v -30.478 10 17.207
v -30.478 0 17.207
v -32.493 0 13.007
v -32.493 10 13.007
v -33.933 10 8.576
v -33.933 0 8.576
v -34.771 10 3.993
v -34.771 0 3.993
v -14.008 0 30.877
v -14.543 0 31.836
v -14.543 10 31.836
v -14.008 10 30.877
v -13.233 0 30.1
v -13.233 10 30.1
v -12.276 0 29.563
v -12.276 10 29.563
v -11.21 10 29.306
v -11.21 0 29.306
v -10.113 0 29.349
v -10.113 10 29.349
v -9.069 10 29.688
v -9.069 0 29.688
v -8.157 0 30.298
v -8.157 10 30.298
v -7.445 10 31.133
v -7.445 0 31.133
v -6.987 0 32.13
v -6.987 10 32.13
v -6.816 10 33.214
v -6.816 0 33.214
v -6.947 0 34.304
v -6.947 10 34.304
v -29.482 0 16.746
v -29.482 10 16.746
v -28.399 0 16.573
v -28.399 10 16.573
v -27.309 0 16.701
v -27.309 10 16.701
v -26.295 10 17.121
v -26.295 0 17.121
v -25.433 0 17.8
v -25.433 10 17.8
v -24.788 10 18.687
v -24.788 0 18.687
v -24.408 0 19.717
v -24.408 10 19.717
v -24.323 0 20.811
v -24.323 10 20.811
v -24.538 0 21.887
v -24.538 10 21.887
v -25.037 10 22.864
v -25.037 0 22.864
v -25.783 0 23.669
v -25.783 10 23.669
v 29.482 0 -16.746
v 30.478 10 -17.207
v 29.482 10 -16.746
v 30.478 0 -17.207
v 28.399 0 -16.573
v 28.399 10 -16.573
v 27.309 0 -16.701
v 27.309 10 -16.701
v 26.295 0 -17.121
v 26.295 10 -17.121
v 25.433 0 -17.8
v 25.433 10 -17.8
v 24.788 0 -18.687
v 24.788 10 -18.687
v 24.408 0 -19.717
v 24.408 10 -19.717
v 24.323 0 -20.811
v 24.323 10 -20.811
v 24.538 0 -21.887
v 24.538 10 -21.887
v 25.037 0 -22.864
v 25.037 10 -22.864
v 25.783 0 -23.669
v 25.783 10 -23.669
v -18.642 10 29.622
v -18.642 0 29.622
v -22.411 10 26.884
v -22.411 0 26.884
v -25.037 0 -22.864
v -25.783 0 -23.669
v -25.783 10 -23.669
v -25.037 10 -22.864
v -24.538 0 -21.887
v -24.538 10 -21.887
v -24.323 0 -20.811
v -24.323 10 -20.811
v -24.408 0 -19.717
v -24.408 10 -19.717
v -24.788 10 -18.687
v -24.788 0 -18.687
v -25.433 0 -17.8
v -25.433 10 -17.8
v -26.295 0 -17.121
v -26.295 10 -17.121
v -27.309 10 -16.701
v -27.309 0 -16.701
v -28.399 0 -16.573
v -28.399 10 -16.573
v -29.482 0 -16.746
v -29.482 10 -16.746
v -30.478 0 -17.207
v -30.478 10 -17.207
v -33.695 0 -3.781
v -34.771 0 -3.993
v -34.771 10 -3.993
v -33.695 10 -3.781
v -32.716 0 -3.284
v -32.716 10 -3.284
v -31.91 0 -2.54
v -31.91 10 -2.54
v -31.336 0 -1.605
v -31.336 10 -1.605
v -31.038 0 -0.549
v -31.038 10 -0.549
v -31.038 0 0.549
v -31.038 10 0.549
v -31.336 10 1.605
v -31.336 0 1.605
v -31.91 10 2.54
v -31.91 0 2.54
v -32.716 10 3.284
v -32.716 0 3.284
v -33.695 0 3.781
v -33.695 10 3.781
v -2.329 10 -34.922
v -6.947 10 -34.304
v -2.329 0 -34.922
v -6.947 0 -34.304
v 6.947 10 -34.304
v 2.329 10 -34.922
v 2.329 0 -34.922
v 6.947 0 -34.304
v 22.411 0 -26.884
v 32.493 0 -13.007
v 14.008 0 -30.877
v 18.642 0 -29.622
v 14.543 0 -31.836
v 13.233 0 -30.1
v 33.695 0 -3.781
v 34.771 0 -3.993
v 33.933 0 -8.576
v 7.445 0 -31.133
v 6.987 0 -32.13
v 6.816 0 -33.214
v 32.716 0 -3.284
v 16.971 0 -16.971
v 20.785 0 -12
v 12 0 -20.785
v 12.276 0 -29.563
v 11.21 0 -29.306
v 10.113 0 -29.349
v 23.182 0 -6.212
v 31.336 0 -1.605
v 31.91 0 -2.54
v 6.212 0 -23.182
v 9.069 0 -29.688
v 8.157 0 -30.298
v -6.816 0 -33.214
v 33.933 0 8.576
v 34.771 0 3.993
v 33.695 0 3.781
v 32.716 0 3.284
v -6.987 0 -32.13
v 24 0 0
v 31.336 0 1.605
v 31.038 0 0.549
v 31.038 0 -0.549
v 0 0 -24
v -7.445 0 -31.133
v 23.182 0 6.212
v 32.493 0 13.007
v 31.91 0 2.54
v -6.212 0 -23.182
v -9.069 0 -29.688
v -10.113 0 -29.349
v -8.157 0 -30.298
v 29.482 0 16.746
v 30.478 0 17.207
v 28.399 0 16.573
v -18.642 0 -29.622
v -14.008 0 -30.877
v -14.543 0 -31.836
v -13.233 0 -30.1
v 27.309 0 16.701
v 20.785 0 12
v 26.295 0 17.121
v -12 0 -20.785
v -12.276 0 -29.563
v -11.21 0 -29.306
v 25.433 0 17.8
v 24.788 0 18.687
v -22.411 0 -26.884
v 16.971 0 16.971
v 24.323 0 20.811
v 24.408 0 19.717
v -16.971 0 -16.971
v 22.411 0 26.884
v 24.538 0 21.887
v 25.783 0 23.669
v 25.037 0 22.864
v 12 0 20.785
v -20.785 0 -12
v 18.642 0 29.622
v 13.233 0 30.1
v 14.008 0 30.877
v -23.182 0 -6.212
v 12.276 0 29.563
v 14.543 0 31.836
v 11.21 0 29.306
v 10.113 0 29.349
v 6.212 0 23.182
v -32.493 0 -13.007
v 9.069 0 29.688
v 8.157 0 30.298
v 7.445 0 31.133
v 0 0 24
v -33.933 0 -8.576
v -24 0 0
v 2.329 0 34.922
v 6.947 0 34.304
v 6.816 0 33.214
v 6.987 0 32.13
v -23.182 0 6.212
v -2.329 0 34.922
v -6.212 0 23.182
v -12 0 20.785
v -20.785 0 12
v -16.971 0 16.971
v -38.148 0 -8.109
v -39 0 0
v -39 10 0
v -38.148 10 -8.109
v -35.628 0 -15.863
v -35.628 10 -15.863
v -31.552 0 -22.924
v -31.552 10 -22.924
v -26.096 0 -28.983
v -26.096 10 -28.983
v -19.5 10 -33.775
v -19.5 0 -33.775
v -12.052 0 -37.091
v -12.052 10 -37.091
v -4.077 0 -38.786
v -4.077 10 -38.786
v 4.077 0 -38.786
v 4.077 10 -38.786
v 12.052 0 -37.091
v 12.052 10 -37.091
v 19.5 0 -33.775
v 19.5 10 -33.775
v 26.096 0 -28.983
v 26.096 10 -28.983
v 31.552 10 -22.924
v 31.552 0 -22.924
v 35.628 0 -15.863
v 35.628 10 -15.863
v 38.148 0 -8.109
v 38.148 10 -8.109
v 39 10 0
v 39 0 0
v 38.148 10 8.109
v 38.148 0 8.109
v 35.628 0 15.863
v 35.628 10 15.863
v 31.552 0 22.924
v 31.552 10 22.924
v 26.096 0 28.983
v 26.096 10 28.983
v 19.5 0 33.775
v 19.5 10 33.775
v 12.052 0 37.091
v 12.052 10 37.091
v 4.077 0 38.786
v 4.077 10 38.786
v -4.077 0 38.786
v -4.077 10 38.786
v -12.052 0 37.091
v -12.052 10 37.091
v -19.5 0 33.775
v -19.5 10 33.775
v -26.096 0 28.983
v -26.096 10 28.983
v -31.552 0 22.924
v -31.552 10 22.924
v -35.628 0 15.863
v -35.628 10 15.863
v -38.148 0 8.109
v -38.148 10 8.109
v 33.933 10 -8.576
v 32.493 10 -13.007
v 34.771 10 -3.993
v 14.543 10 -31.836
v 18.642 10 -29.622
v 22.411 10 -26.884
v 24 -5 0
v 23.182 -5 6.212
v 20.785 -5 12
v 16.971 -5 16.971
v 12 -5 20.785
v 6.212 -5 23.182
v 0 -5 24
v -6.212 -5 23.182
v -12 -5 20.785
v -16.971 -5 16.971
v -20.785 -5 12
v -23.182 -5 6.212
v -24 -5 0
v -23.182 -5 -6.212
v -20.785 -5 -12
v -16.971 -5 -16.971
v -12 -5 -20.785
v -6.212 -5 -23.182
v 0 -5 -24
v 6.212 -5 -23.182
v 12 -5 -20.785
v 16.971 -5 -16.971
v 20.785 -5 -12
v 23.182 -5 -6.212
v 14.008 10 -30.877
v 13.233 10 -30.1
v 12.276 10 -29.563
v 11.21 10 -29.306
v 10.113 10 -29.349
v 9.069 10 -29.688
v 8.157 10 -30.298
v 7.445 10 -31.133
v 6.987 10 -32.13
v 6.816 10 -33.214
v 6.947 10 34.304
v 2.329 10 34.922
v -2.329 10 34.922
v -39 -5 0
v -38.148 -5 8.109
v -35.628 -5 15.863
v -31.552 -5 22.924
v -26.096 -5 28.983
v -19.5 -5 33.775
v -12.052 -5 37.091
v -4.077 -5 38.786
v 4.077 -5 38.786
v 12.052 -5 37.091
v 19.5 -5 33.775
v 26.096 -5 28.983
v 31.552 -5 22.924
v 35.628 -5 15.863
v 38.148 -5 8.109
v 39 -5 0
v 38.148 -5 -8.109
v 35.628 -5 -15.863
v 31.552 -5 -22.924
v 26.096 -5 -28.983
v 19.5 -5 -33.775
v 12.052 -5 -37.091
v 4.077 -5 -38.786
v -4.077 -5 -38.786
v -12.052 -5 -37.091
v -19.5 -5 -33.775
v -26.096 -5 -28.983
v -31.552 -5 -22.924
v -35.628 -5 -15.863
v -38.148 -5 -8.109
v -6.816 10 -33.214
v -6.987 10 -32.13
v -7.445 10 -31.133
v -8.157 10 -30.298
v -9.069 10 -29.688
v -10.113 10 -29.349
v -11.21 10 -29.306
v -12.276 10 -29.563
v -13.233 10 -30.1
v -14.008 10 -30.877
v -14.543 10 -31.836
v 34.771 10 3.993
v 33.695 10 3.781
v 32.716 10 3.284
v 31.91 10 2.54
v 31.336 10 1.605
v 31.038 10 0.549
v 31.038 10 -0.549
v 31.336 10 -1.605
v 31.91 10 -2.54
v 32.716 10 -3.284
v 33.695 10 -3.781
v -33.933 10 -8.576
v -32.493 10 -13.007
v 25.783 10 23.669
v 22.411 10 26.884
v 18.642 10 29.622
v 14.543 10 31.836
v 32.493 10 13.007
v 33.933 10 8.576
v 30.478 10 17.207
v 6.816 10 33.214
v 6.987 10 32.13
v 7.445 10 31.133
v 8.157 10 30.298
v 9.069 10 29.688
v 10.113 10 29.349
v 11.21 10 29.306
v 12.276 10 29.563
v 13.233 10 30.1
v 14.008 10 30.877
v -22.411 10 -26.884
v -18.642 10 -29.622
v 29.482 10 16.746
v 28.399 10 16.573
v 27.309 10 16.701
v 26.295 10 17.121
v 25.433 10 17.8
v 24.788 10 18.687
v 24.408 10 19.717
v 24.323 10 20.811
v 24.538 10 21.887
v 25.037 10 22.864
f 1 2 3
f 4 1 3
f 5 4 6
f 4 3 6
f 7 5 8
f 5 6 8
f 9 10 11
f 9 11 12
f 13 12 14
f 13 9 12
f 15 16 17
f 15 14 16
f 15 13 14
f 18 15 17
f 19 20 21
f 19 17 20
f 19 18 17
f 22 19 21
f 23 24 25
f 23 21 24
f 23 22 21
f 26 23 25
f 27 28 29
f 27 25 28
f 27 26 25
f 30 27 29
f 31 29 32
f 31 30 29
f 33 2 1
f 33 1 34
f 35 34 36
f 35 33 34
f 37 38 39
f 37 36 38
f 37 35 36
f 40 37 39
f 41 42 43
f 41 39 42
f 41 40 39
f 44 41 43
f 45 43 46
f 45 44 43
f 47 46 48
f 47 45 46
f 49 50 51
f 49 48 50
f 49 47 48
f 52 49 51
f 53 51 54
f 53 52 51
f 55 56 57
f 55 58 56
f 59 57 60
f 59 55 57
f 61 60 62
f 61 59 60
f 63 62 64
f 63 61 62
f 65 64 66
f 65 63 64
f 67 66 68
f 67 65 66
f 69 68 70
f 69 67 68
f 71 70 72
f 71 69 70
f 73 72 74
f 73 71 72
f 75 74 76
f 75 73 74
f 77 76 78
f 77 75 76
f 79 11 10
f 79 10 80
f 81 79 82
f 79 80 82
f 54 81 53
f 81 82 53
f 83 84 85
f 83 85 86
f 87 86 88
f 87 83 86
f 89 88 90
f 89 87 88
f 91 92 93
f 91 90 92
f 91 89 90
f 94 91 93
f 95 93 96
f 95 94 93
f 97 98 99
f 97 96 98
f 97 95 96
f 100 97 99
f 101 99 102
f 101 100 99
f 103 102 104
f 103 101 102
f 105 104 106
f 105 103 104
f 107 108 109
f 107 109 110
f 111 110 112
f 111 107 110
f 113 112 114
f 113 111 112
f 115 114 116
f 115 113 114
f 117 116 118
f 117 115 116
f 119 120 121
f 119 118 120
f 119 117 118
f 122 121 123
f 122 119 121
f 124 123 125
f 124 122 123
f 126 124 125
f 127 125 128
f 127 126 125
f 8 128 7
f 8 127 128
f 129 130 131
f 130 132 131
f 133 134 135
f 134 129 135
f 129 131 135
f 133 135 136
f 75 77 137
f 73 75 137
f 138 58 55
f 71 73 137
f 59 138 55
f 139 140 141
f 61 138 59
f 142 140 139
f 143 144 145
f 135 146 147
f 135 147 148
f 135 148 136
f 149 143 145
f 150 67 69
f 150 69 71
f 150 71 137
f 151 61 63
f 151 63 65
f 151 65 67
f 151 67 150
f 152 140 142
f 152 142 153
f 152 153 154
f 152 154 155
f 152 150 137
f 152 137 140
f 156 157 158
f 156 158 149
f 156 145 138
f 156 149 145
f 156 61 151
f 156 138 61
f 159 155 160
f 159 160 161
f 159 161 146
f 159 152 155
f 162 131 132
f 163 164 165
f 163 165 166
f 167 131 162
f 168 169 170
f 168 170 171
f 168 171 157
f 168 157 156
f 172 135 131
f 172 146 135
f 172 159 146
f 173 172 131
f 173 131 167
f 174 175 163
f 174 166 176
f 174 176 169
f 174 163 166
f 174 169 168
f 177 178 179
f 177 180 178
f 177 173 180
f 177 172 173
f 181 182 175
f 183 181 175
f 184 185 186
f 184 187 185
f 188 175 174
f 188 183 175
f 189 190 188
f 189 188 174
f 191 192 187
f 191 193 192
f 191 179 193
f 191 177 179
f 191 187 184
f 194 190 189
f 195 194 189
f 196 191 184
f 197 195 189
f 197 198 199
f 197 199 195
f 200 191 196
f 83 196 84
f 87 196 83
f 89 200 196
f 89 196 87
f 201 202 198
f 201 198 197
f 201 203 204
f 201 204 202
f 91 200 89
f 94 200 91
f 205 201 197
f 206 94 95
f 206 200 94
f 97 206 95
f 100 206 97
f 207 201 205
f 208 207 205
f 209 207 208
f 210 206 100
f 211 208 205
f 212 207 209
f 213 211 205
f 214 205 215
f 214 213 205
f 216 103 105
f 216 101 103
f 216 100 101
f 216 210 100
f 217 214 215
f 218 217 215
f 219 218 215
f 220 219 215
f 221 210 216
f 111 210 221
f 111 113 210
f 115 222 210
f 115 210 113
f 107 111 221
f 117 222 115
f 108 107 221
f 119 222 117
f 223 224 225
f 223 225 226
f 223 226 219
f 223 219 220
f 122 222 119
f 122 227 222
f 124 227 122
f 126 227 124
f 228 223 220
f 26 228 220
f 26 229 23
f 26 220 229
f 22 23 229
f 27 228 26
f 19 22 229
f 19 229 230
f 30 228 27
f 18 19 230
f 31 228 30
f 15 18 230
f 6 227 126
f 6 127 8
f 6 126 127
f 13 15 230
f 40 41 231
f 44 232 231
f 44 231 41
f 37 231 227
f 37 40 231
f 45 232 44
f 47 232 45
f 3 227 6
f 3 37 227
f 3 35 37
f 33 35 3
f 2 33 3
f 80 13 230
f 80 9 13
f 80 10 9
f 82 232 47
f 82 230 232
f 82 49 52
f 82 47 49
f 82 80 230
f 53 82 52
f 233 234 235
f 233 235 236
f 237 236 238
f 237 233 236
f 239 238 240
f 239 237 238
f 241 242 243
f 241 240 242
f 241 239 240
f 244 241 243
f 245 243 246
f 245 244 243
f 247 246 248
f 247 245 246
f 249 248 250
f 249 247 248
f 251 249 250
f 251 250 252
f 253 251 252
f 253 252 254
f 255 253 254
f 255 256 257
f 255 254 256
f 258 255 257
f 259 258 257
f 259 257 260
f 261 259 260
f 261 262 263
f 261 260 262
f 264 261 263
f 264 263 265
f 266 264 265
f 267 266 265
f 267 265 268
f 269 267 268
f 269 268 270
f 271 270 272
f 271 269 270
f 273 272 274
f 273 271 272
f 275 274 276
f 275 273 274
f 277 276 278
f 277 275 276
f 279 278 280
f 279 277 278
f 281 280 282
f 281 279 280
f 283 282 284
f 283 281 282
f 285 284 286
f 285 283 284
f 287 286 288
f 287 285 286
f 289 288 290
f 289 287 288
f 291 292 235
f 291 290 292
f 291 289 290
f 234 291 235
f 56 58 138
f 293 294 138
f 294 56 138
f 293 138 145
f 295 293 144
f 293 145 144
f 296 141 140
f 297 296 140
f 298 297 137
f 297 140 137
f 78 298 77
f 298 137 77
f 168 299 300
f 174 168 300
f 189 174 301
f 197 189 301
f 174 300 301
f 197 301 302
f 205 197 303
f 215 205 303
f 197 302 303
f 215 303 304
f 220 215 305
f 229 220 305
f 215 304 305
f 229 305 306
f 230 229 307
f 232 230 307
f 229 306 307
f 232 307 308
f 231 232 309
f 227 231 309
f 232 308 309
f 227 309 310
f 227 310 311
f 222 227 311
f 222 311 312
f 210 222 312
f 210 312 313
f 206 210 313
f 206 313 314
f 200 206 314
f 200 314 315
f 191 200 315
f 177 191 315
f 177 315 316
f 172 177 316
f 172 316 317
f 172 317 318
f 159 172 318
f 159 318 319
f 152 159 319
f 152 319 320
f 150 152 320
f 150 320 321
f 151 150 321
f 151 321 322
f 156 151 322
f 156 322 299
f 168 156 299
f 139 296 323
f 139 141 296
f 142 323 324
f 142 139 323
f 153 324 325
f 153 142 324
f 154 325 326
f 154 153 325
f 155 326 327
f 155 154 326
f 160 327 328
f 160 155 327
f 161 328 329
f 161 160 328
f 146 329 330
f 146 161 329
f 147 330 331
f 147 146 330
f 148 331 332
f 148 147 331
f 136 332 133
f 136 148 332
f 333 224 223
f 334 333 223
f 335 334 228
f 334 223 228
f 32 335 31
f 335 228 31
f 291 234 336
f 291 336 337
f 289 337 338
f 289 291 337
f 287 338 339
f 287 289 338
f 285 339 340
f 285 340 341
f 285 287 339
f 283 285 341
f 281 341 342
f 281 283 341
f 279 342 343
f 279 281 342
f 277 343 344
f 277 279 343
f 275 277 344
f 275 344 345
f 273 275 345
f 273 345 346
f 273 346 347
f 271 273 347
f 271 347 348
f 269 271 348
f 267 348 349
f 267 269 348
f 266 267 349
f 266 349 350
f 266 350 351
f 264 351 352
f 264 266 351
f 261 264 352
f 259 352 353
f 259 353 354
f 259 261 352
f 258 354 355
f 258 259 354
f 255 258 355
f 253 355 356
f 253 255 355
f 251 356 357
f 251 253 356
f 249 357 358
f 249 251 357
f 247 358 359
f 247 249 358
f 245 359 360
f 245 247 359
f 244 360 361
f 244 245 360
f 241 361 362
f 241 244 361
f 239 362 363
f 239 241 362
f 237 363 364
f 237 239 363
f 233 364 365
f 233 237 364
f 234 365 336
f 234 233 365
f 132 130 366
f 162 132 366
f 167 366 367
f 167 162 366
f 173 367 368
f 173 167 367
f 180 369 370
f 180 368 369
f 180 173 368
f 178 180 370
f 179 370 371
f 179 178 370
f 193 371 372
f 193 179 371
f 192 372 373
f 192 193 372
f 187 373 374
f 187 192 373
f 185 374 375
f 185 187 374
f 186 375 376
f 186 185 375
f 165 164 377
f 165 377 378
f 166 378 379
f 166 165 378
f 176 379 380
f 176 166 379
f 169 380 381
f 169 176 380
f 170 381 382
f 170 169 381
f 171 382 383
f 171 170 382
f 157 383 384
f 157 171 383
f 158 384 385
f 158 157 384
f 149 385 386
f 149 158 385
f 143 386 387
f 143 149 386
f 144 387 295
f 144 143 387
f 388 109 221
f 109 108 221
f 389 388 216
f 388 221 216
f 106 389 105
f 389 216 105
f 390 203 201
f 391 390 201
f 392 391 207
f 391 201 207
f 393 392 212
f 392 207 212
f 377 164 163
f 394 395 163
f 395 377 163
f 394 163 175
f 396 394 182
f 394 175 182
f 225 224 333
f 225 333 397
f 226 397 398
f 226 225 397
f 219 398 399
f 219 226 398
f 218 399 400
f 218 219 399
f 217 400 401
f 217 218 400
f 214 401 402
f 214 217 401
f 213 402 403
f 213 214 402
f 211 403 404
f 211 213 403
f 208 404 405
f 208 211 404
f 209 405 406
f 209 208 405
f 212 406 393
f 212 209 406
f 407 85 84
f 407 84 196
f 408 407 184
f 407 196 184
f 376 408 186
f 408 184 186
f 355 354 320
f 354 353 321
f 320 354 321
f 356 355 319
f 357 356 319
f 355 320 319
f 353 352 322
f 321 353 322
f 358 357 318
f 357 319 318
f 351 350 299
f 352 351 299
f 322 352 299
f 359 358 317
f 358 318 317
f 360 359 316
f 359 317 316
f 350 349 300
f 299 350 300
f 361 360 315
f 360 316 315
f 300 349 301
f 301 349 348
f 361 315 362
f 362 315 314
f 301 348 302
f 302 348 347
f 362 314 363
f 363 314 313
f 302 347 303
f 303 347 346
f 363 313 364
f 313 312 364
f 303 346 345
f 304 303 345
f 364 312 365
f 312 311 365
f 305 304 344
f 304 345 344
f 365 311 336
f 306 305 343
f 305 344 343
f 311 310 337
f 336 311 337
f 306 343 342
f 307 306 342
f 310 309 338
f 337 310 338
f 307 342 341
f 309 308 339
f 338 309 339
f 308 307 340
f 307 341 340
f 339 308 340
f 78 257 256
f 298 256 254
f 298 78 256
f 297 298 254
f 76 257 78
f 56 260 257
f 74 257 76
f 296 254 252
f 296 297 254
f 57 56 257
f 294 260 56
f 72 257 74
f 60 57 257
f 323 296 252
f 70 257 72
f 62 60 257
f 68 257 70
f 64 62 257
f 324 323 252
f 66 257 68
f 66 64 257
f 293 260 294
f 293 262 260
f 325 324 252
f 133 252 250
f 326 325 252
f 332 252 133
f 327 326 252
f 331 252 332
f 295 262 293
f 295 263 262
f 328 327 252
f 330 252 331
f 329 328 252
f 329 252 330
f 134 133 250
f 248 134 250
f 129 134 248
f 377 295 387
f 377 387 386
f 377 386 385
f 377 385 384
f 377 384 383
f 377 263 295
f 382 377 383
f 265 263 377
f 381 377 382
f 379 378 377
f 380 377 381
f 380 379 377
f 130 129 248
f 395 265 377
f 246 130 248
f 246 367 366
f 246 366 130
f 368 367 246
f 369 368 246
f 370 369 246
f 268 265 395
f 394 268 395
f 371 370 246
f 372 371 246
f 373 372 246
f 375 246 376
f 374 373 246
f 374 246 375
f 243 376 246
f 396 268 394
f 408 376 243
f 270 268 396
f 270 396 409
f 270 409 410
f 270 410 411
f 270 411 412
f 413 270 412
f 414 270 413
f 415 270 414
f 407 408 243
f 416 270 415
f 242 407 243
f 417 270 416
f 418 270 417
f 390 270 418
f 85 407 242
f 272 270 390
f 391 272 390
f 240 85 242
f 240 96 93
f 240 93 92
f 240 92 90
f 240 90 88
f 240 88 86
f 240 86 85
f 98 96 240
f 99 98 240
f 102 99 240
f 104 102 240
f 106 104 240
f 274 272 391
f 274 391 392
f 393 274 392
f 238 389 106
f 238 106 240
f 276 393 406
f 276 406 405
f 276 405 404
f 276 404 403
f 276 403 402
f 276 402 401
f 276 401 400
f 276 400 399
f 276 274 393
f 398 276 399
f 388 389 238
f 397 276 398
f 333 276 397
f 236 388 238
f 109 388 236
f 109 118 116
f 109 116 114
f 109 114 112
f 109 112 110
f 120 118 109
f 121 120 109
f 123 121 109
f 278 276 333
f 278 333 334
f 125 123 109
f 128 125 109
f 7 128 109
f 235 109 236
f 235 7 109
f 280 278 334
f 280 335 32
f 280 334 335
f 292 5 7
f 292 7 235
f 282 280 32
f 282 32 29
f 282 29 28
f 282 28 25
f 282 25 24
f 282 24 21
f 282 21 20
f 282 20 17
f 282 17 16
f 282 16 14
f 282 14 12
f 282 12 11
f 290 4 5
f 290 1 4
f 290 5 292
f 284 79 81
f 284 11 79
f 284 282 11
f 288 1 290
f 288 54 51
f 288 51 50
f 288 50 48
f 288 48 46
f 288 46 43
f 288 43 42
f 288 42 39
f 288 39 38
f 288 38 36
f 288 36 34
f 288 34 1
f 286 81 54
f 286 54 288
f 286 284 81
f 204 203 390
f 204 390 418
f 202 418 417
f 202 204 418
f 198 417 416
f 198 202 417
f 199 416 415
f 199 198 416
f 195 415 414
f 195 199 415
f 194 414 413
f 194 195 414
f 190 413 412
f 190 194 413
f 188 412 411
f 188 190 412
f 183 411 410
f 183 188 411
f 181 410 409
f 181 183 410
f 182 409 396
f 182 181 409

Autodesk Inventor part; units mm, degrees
ref_plane "YZ Plane" through (0, 0, 0) normal (1, 0, 0) x (0, 1, 0)
ref_plane "XZ Plane" through (0, 0, 0) normal (0, 1, 0) x (-1, 0, 0)
ref_plane "XY Plane" through (0, 0, 0) normal (0, 0, 1) x (1, 0, 0)
sketch "Sketch1" plane through (0, 0, 0) normal (0, 1, 0) x (-1, 0, 0)
  circle A0 centre (0, 0) radius 35
  circle A1 centre (35, 0) radius 4
  circle A2 centre (28.3156, 20.5725) radius 4
  circle A3 centre (10.8156, 33.287) radius 4
  circle A4 centre (-10.8156, 33.287) radius 4
  circle A5 centre (-28.3156, 20.5725) radius 4
  circle A6 centre (-35, 0) radius 4
  circle A7 centre (-28.3156, -20.5725) radius 4
  circle A8 centre (-10.8156, -33.287) radius 4
  circle A9 centre (10.8156, -33.287) radius 4
  circle A10 centre (28.3156, -20.5725) radius 4
  circle A11 centre (0, 0) radius 39
  point P0 (-25.7834, 23.6689)
  point P1 (-14.543, 31.8355)
  point P2 (-6.947, 34.3036)
  point P3 (6.947, 34.3036)
  point P4 (14.543, 31.8355)
  point P5 (25.7834, 23.6689)
  point P6 (30.478, 17.2074)
  point P7 (34.7714, 3.9935)
  point P8 (34.7714, -3.9935)
  point P9 (30.478, -17.2074)
  point P10 (25.7834, -23.6689)
  point P11 (14.543, -31.8355)
  point P12 (6.947, -34.3036)
  point P13 (-6.947, -34.3036)
  point P14 (-14.543, -31.8355)
  point P15 (-25.7834, -23.6689)
  point P16 (-30.478, -17.2074)
  point P17 (-34.7714, -3.9935)
  point P18 (-34.7714, 3.9935)
  point P19 (-30.478, 17.2074)
  dimension "d1" = 70
  dimension "d2" = 8
  dimension "d5" = 360
  dimension "d7" = 78
extrude "Extrusion1" add sketch "Sketch1" against normal blind 5
extrude "Extrusion2" add sketch "Sketch1" along normal blind 10 contours A0 A1 | A0 A1 | A0 A2 A11 A1 | A1 A11 A10 A0 | A2 A0 | A0 A2 | A10 A0 | A0 A10 | A0 A3 A11 A2 | A11 A9 A0 A10 | A3 A0 | A0 A3 | A3 A0 A4 A11 | A11 A8 A0 A9 | A9 A0 | A0 A9 | A4 A0 | A4 A0 A5 A11 | A11 A7 A0 A8 | A8 A0 | A4 A0 | A5 A0 | A5 A0 A6 A11 | A0 A8 | A11 A6 A0 A7 | A7 A0 | A5 A0 | A6 A0 | A0 A7 | A6 A0
sketch "Sketch2" plane through (0, 0, 0) normal (0, 1, 0) x (1, 0, 0)
  circle A0 centre (0, 0) radius 5
  dimension "d12" = 10
extrude "Extrusion3" cut sketch "Sketch2" against normal blind 10
sketch "Sketch3" plane through (0, -5, 0) normal (0, -1, 0) x (1, 0, 0)
  circle A0 centre (0, 0) radius 24
  dimension "d18" = 48
extrude "Extrusion4" cut sketch "Sketch3" against normal blind 10
properties part number "ring"
